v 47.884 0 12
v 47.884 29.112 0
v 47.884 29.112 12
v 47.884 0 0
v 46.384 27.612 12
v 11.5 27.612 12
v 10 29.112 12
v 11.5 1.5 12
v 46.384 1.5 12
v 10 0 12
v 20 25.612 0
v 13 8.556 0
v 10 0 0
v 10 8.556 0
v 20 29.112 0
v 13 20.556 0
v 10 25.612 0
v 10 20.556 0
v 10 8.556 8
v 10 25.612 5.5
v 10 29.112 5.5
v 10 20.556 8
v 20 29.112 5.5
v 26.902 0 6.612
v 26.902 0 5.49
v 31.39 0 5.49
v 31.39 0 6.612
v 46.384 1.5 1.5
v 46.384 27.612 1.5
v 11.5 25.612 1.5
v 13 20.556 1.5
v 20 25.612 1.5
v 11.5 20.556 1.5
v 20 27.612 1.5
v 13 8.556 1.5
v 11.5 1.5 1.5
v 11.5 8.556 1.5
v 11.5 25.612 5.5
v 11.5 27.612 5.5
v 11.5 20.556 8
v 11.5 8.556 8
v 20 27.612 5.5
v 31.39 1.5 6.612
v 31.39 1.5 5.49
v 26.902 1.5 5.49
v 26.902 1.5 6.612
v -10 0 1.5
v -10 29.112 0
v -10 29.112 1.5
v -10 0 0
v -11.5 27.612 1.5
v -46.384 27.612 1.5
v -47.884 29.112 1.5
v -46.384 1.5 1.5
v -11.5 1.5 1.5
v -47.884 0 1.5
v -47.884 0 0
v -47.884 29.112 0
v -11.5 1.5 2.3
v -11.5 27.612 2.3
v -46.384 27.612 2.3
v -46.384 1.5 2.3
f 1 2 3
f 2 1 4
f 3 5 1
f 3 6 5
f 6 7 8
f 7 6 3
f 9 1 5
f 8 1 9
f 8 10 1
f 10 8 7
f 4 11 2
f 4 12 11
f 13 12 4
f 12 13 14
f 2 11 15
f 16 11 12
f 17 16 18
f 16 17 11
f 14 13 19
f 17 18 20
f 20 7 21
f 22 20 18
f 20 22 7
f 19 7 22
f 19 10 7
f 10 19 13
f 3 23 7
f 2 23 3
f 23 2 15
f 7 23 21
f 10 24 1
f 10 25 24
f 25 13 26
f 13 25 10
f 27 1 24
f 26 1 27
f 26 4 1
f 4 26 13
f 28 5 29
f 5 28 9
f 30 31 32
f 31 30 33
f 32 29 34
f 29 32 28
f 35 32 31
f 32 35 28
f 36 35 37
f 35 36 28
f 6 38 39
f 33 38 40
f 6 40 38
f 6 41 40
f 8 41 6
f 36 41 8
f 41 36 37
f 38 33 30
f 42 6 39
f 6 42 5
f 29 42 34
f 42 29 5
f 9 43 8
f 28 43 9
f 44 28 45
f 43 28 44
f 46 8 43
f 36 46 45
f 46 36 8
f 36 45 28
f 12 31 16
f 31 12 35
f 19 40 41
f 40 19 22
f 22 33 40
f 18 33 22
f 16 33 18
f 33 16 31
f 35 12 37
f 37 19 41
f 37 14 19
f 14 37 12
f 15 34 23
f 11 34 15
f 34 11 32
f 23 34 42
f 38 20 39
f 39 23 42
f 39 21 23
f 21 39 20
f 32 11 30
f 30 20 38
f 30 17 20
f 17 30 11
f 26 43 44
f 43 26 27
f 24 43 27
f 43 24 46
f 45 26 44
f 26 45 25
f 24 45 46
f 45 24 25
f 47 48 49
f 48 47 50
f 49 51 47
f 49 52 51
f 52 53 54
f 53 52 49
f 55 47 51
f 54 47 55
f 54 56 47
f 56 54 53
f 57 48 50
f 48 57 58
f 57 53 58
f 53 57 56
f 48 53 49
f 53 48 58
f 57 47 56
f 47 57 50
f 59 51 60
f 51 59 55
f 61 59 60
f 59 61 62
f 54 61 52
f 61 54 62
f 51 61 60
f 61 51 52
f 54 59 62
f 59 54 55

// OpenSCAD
length = 34.2 * 1.02;
width = 25.6 * 1.02;

height = 12.0;

thickness = 1.5;
fudge = 0.8;

cylinder_fn = 18;

// case
translate([10, 0, 0])
difference()
{
    translate([0, 0, 0])
        cube([length + 2*thickness, width + 2*thickness, height]);
    translate([thickness, thickness, thickness])
        cube([length, width, height]);
    
    // usb connector
    translate([0, width/2 + thickness - 6, 0])
        cube([3, 12 ,8]);
    
    // reset button
    translate([0, thickness + width - 2, 0])
        cube([10, 2 + thickness, 4 + thickness]);
    
    // cable hole
    translate([(length - 4 * 1.02) / 2 + thickness, 0, (height - 1 * 1.02) / 2])
        cube([4.4 * 1.02, thickness, 1.1 * 1.02]);
}


// top
translate([-10 - length - 2*thickness, 0, 0])
difference()
{
    union()
    {
        translate([0, 0, 0])
            cube([length + 2*thickness, width + 2*thickness, thickness]);
        translate([thickness, thickness, 0])
            cube([length, width, thickness + fudge]);
    }    
}
